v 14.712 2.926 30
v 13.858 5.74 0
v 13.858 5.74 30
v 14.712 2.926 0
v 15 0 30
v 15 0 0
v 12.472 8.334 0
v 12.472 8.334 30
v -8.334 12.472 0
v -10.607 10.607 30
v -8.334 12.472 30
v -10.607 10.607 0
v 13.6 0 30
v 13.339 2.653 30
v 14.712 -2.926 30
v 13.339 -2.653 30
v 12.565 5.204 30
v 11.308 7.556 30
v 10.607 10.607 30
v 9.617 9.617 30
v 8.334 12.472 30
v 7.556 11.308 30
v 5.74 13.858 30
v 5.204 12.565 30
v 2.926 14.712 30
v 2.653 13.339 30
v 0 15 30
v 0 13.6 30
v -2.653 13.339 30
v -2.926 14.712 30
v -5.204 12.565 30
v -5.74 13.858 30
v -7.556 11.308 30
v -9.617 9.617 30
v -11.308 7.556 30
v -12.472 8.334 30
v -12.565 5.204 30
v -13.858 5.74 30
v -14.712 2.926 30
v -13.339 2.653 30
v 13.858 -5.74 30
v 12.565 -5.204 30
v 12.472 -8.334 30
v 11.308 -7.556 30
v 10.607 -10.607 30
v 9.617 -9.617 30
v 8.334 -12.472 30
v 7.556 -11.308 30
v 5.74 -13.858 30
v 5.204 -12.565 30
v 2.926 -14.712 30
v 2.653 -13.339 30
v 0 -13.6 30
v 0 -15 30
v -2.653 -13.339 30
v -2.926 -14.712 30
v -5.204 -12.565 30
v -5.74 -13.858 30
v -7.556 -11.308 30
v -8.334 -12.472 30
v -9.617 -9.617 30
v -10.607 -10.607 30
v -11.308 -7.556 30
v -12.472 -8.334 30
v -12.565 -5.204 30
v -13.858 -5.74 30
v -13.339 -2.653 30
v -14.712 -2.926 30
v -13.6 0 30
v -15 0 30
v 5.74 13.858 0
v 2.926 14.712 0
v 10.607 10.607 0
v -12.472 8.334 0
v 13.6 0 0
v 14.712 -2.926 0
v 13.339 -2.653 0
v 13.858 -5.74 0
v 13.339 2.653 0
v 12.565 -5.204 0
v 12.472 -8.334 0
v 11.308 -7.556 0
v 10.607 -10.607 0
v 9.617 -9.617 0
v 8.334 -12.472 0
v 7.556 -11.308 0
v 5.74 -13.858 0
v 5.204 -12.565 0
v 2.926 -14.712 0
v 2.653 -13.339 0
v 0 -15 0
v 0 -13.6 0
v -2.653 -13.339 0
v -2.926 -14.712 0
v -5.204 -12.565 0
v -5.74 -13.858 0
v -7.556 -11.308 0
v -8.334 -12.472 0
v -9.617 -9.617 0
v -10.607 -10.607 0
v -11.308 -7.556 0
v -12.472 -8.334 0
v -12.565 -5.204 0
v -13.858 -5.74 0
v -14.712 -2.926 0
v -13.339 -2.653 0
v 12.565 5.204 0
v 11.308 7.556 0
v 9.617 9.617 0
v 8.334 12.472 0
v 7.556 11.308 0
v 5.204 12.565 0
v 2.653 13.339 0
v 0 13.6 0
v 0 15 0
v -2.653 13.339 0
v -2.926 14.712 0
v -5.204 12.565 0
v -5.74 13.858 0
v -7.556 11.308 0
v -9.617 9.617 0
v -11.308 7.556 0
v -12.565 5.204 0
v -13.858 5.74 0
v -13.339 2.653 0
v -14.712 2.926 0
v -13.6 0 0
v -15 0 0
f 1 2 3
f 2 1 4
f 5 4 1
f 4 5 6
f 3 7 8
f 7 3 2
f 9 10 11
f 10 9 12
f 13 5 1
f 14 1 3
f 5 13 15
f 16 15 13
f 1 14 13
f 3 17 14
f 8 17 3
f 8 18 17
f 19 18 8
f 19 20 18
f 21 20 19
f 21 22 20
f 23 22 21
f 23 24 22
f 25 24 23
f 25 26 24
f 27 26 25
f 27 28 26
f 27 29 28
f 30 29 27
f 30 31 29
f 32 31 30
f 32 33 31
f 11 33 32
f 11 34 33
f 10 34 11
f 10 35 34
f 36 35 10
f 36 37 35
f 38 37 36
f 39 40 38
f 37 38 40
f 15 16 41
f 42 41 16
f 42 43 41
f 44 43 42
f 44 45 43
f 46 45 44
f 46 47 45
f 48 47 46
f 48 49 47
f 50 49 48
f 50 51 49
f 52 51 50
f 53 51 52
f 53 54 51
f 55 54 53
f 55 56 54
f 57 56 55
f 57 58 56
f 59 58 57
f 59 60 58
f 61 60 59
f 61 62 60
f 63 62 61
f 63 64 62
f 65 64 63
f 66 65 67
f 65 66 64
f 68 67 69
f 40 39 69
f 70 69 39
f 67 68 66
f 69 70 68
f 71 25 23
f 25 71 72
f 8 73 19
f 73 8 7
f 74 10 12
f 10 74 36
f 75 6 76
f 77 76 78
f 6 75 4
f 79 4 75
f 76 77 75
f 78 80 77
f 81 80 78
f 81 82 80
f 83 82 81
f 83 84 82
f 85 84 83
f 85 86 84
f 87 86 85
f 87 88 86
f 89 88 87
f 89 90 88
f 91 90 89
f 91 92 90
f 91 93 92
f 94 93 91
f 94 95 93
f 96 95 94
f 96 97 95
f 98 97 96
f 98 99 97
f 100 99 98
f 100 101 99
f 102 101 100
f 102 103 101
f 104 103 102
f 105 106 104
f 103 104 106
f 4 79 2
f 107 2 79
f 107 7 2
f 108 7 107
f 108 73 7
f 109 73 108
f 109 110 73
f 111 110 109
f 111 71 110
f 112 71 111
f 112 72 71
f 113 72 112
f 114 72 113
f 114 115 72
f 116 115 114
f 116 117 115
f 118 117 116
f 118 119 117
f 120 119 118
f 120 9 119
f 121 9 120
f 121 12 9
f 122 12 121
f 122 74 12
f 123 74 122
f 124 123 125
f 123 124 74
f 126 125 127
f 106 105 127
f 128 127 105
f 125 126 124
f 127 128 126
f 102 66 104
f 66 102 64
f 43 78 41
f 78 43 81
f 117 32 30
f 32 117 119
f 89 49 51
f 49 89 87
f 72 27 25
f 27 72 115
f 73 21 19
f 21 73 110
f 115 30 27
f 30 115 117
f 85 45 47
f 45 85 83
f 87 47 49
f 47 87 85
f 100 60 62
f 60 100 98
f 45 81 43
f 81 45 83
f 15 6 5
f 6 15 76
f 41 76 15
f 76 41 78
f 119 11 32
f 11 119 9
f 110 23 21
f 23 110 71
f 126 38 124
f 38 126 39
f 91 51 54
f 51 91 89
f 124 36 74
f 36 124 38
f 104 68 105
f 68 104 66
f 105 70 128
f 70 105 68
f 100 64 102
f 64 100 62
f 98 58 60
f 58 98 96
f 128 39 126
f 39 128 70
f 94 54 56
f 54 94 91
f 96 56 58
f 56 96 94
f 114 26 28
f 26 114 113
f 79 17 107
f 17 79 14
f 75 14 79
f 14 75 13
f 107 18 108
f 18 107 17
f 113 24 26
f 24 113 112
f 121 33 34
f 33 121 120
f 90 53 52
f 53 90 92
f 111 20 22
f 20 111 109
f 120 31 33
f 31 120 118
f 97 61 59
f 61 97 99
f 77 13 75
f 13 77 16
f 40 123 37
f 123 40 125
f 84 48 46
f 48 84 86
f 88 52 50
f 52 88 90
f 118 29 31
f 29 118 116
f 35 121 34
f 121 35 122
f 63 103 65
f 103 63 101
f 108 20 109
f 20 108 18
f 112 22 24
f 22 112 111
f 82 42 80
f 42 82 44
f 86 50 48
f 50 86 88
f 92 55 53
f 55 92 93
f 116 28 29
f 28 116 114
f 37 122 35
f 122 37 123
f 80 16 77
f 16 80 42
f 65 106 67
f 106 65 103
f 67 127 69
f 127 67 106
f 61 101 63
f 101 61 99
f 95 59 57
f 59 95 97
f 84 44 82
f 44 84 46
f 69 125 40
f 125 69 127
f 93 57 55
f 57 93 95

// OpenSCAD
$fn = 32;

// ----------------------------------------------------------------------
// Thin tube: 1.4 mm wall
// ----------------------------------------------------------------------

// --- parameters (mm) ---
tube_od = 30;             // outer diameter
tube_h = 30;              // height, Z
wall = 1.4;               // wall thickness

difference() {
  cylinder(h = tube_h, d = tube_od);
  translate([0, 0, -1]) cylinder(h = tube_h + 2, d = tube_od - 2 * wall);
}
